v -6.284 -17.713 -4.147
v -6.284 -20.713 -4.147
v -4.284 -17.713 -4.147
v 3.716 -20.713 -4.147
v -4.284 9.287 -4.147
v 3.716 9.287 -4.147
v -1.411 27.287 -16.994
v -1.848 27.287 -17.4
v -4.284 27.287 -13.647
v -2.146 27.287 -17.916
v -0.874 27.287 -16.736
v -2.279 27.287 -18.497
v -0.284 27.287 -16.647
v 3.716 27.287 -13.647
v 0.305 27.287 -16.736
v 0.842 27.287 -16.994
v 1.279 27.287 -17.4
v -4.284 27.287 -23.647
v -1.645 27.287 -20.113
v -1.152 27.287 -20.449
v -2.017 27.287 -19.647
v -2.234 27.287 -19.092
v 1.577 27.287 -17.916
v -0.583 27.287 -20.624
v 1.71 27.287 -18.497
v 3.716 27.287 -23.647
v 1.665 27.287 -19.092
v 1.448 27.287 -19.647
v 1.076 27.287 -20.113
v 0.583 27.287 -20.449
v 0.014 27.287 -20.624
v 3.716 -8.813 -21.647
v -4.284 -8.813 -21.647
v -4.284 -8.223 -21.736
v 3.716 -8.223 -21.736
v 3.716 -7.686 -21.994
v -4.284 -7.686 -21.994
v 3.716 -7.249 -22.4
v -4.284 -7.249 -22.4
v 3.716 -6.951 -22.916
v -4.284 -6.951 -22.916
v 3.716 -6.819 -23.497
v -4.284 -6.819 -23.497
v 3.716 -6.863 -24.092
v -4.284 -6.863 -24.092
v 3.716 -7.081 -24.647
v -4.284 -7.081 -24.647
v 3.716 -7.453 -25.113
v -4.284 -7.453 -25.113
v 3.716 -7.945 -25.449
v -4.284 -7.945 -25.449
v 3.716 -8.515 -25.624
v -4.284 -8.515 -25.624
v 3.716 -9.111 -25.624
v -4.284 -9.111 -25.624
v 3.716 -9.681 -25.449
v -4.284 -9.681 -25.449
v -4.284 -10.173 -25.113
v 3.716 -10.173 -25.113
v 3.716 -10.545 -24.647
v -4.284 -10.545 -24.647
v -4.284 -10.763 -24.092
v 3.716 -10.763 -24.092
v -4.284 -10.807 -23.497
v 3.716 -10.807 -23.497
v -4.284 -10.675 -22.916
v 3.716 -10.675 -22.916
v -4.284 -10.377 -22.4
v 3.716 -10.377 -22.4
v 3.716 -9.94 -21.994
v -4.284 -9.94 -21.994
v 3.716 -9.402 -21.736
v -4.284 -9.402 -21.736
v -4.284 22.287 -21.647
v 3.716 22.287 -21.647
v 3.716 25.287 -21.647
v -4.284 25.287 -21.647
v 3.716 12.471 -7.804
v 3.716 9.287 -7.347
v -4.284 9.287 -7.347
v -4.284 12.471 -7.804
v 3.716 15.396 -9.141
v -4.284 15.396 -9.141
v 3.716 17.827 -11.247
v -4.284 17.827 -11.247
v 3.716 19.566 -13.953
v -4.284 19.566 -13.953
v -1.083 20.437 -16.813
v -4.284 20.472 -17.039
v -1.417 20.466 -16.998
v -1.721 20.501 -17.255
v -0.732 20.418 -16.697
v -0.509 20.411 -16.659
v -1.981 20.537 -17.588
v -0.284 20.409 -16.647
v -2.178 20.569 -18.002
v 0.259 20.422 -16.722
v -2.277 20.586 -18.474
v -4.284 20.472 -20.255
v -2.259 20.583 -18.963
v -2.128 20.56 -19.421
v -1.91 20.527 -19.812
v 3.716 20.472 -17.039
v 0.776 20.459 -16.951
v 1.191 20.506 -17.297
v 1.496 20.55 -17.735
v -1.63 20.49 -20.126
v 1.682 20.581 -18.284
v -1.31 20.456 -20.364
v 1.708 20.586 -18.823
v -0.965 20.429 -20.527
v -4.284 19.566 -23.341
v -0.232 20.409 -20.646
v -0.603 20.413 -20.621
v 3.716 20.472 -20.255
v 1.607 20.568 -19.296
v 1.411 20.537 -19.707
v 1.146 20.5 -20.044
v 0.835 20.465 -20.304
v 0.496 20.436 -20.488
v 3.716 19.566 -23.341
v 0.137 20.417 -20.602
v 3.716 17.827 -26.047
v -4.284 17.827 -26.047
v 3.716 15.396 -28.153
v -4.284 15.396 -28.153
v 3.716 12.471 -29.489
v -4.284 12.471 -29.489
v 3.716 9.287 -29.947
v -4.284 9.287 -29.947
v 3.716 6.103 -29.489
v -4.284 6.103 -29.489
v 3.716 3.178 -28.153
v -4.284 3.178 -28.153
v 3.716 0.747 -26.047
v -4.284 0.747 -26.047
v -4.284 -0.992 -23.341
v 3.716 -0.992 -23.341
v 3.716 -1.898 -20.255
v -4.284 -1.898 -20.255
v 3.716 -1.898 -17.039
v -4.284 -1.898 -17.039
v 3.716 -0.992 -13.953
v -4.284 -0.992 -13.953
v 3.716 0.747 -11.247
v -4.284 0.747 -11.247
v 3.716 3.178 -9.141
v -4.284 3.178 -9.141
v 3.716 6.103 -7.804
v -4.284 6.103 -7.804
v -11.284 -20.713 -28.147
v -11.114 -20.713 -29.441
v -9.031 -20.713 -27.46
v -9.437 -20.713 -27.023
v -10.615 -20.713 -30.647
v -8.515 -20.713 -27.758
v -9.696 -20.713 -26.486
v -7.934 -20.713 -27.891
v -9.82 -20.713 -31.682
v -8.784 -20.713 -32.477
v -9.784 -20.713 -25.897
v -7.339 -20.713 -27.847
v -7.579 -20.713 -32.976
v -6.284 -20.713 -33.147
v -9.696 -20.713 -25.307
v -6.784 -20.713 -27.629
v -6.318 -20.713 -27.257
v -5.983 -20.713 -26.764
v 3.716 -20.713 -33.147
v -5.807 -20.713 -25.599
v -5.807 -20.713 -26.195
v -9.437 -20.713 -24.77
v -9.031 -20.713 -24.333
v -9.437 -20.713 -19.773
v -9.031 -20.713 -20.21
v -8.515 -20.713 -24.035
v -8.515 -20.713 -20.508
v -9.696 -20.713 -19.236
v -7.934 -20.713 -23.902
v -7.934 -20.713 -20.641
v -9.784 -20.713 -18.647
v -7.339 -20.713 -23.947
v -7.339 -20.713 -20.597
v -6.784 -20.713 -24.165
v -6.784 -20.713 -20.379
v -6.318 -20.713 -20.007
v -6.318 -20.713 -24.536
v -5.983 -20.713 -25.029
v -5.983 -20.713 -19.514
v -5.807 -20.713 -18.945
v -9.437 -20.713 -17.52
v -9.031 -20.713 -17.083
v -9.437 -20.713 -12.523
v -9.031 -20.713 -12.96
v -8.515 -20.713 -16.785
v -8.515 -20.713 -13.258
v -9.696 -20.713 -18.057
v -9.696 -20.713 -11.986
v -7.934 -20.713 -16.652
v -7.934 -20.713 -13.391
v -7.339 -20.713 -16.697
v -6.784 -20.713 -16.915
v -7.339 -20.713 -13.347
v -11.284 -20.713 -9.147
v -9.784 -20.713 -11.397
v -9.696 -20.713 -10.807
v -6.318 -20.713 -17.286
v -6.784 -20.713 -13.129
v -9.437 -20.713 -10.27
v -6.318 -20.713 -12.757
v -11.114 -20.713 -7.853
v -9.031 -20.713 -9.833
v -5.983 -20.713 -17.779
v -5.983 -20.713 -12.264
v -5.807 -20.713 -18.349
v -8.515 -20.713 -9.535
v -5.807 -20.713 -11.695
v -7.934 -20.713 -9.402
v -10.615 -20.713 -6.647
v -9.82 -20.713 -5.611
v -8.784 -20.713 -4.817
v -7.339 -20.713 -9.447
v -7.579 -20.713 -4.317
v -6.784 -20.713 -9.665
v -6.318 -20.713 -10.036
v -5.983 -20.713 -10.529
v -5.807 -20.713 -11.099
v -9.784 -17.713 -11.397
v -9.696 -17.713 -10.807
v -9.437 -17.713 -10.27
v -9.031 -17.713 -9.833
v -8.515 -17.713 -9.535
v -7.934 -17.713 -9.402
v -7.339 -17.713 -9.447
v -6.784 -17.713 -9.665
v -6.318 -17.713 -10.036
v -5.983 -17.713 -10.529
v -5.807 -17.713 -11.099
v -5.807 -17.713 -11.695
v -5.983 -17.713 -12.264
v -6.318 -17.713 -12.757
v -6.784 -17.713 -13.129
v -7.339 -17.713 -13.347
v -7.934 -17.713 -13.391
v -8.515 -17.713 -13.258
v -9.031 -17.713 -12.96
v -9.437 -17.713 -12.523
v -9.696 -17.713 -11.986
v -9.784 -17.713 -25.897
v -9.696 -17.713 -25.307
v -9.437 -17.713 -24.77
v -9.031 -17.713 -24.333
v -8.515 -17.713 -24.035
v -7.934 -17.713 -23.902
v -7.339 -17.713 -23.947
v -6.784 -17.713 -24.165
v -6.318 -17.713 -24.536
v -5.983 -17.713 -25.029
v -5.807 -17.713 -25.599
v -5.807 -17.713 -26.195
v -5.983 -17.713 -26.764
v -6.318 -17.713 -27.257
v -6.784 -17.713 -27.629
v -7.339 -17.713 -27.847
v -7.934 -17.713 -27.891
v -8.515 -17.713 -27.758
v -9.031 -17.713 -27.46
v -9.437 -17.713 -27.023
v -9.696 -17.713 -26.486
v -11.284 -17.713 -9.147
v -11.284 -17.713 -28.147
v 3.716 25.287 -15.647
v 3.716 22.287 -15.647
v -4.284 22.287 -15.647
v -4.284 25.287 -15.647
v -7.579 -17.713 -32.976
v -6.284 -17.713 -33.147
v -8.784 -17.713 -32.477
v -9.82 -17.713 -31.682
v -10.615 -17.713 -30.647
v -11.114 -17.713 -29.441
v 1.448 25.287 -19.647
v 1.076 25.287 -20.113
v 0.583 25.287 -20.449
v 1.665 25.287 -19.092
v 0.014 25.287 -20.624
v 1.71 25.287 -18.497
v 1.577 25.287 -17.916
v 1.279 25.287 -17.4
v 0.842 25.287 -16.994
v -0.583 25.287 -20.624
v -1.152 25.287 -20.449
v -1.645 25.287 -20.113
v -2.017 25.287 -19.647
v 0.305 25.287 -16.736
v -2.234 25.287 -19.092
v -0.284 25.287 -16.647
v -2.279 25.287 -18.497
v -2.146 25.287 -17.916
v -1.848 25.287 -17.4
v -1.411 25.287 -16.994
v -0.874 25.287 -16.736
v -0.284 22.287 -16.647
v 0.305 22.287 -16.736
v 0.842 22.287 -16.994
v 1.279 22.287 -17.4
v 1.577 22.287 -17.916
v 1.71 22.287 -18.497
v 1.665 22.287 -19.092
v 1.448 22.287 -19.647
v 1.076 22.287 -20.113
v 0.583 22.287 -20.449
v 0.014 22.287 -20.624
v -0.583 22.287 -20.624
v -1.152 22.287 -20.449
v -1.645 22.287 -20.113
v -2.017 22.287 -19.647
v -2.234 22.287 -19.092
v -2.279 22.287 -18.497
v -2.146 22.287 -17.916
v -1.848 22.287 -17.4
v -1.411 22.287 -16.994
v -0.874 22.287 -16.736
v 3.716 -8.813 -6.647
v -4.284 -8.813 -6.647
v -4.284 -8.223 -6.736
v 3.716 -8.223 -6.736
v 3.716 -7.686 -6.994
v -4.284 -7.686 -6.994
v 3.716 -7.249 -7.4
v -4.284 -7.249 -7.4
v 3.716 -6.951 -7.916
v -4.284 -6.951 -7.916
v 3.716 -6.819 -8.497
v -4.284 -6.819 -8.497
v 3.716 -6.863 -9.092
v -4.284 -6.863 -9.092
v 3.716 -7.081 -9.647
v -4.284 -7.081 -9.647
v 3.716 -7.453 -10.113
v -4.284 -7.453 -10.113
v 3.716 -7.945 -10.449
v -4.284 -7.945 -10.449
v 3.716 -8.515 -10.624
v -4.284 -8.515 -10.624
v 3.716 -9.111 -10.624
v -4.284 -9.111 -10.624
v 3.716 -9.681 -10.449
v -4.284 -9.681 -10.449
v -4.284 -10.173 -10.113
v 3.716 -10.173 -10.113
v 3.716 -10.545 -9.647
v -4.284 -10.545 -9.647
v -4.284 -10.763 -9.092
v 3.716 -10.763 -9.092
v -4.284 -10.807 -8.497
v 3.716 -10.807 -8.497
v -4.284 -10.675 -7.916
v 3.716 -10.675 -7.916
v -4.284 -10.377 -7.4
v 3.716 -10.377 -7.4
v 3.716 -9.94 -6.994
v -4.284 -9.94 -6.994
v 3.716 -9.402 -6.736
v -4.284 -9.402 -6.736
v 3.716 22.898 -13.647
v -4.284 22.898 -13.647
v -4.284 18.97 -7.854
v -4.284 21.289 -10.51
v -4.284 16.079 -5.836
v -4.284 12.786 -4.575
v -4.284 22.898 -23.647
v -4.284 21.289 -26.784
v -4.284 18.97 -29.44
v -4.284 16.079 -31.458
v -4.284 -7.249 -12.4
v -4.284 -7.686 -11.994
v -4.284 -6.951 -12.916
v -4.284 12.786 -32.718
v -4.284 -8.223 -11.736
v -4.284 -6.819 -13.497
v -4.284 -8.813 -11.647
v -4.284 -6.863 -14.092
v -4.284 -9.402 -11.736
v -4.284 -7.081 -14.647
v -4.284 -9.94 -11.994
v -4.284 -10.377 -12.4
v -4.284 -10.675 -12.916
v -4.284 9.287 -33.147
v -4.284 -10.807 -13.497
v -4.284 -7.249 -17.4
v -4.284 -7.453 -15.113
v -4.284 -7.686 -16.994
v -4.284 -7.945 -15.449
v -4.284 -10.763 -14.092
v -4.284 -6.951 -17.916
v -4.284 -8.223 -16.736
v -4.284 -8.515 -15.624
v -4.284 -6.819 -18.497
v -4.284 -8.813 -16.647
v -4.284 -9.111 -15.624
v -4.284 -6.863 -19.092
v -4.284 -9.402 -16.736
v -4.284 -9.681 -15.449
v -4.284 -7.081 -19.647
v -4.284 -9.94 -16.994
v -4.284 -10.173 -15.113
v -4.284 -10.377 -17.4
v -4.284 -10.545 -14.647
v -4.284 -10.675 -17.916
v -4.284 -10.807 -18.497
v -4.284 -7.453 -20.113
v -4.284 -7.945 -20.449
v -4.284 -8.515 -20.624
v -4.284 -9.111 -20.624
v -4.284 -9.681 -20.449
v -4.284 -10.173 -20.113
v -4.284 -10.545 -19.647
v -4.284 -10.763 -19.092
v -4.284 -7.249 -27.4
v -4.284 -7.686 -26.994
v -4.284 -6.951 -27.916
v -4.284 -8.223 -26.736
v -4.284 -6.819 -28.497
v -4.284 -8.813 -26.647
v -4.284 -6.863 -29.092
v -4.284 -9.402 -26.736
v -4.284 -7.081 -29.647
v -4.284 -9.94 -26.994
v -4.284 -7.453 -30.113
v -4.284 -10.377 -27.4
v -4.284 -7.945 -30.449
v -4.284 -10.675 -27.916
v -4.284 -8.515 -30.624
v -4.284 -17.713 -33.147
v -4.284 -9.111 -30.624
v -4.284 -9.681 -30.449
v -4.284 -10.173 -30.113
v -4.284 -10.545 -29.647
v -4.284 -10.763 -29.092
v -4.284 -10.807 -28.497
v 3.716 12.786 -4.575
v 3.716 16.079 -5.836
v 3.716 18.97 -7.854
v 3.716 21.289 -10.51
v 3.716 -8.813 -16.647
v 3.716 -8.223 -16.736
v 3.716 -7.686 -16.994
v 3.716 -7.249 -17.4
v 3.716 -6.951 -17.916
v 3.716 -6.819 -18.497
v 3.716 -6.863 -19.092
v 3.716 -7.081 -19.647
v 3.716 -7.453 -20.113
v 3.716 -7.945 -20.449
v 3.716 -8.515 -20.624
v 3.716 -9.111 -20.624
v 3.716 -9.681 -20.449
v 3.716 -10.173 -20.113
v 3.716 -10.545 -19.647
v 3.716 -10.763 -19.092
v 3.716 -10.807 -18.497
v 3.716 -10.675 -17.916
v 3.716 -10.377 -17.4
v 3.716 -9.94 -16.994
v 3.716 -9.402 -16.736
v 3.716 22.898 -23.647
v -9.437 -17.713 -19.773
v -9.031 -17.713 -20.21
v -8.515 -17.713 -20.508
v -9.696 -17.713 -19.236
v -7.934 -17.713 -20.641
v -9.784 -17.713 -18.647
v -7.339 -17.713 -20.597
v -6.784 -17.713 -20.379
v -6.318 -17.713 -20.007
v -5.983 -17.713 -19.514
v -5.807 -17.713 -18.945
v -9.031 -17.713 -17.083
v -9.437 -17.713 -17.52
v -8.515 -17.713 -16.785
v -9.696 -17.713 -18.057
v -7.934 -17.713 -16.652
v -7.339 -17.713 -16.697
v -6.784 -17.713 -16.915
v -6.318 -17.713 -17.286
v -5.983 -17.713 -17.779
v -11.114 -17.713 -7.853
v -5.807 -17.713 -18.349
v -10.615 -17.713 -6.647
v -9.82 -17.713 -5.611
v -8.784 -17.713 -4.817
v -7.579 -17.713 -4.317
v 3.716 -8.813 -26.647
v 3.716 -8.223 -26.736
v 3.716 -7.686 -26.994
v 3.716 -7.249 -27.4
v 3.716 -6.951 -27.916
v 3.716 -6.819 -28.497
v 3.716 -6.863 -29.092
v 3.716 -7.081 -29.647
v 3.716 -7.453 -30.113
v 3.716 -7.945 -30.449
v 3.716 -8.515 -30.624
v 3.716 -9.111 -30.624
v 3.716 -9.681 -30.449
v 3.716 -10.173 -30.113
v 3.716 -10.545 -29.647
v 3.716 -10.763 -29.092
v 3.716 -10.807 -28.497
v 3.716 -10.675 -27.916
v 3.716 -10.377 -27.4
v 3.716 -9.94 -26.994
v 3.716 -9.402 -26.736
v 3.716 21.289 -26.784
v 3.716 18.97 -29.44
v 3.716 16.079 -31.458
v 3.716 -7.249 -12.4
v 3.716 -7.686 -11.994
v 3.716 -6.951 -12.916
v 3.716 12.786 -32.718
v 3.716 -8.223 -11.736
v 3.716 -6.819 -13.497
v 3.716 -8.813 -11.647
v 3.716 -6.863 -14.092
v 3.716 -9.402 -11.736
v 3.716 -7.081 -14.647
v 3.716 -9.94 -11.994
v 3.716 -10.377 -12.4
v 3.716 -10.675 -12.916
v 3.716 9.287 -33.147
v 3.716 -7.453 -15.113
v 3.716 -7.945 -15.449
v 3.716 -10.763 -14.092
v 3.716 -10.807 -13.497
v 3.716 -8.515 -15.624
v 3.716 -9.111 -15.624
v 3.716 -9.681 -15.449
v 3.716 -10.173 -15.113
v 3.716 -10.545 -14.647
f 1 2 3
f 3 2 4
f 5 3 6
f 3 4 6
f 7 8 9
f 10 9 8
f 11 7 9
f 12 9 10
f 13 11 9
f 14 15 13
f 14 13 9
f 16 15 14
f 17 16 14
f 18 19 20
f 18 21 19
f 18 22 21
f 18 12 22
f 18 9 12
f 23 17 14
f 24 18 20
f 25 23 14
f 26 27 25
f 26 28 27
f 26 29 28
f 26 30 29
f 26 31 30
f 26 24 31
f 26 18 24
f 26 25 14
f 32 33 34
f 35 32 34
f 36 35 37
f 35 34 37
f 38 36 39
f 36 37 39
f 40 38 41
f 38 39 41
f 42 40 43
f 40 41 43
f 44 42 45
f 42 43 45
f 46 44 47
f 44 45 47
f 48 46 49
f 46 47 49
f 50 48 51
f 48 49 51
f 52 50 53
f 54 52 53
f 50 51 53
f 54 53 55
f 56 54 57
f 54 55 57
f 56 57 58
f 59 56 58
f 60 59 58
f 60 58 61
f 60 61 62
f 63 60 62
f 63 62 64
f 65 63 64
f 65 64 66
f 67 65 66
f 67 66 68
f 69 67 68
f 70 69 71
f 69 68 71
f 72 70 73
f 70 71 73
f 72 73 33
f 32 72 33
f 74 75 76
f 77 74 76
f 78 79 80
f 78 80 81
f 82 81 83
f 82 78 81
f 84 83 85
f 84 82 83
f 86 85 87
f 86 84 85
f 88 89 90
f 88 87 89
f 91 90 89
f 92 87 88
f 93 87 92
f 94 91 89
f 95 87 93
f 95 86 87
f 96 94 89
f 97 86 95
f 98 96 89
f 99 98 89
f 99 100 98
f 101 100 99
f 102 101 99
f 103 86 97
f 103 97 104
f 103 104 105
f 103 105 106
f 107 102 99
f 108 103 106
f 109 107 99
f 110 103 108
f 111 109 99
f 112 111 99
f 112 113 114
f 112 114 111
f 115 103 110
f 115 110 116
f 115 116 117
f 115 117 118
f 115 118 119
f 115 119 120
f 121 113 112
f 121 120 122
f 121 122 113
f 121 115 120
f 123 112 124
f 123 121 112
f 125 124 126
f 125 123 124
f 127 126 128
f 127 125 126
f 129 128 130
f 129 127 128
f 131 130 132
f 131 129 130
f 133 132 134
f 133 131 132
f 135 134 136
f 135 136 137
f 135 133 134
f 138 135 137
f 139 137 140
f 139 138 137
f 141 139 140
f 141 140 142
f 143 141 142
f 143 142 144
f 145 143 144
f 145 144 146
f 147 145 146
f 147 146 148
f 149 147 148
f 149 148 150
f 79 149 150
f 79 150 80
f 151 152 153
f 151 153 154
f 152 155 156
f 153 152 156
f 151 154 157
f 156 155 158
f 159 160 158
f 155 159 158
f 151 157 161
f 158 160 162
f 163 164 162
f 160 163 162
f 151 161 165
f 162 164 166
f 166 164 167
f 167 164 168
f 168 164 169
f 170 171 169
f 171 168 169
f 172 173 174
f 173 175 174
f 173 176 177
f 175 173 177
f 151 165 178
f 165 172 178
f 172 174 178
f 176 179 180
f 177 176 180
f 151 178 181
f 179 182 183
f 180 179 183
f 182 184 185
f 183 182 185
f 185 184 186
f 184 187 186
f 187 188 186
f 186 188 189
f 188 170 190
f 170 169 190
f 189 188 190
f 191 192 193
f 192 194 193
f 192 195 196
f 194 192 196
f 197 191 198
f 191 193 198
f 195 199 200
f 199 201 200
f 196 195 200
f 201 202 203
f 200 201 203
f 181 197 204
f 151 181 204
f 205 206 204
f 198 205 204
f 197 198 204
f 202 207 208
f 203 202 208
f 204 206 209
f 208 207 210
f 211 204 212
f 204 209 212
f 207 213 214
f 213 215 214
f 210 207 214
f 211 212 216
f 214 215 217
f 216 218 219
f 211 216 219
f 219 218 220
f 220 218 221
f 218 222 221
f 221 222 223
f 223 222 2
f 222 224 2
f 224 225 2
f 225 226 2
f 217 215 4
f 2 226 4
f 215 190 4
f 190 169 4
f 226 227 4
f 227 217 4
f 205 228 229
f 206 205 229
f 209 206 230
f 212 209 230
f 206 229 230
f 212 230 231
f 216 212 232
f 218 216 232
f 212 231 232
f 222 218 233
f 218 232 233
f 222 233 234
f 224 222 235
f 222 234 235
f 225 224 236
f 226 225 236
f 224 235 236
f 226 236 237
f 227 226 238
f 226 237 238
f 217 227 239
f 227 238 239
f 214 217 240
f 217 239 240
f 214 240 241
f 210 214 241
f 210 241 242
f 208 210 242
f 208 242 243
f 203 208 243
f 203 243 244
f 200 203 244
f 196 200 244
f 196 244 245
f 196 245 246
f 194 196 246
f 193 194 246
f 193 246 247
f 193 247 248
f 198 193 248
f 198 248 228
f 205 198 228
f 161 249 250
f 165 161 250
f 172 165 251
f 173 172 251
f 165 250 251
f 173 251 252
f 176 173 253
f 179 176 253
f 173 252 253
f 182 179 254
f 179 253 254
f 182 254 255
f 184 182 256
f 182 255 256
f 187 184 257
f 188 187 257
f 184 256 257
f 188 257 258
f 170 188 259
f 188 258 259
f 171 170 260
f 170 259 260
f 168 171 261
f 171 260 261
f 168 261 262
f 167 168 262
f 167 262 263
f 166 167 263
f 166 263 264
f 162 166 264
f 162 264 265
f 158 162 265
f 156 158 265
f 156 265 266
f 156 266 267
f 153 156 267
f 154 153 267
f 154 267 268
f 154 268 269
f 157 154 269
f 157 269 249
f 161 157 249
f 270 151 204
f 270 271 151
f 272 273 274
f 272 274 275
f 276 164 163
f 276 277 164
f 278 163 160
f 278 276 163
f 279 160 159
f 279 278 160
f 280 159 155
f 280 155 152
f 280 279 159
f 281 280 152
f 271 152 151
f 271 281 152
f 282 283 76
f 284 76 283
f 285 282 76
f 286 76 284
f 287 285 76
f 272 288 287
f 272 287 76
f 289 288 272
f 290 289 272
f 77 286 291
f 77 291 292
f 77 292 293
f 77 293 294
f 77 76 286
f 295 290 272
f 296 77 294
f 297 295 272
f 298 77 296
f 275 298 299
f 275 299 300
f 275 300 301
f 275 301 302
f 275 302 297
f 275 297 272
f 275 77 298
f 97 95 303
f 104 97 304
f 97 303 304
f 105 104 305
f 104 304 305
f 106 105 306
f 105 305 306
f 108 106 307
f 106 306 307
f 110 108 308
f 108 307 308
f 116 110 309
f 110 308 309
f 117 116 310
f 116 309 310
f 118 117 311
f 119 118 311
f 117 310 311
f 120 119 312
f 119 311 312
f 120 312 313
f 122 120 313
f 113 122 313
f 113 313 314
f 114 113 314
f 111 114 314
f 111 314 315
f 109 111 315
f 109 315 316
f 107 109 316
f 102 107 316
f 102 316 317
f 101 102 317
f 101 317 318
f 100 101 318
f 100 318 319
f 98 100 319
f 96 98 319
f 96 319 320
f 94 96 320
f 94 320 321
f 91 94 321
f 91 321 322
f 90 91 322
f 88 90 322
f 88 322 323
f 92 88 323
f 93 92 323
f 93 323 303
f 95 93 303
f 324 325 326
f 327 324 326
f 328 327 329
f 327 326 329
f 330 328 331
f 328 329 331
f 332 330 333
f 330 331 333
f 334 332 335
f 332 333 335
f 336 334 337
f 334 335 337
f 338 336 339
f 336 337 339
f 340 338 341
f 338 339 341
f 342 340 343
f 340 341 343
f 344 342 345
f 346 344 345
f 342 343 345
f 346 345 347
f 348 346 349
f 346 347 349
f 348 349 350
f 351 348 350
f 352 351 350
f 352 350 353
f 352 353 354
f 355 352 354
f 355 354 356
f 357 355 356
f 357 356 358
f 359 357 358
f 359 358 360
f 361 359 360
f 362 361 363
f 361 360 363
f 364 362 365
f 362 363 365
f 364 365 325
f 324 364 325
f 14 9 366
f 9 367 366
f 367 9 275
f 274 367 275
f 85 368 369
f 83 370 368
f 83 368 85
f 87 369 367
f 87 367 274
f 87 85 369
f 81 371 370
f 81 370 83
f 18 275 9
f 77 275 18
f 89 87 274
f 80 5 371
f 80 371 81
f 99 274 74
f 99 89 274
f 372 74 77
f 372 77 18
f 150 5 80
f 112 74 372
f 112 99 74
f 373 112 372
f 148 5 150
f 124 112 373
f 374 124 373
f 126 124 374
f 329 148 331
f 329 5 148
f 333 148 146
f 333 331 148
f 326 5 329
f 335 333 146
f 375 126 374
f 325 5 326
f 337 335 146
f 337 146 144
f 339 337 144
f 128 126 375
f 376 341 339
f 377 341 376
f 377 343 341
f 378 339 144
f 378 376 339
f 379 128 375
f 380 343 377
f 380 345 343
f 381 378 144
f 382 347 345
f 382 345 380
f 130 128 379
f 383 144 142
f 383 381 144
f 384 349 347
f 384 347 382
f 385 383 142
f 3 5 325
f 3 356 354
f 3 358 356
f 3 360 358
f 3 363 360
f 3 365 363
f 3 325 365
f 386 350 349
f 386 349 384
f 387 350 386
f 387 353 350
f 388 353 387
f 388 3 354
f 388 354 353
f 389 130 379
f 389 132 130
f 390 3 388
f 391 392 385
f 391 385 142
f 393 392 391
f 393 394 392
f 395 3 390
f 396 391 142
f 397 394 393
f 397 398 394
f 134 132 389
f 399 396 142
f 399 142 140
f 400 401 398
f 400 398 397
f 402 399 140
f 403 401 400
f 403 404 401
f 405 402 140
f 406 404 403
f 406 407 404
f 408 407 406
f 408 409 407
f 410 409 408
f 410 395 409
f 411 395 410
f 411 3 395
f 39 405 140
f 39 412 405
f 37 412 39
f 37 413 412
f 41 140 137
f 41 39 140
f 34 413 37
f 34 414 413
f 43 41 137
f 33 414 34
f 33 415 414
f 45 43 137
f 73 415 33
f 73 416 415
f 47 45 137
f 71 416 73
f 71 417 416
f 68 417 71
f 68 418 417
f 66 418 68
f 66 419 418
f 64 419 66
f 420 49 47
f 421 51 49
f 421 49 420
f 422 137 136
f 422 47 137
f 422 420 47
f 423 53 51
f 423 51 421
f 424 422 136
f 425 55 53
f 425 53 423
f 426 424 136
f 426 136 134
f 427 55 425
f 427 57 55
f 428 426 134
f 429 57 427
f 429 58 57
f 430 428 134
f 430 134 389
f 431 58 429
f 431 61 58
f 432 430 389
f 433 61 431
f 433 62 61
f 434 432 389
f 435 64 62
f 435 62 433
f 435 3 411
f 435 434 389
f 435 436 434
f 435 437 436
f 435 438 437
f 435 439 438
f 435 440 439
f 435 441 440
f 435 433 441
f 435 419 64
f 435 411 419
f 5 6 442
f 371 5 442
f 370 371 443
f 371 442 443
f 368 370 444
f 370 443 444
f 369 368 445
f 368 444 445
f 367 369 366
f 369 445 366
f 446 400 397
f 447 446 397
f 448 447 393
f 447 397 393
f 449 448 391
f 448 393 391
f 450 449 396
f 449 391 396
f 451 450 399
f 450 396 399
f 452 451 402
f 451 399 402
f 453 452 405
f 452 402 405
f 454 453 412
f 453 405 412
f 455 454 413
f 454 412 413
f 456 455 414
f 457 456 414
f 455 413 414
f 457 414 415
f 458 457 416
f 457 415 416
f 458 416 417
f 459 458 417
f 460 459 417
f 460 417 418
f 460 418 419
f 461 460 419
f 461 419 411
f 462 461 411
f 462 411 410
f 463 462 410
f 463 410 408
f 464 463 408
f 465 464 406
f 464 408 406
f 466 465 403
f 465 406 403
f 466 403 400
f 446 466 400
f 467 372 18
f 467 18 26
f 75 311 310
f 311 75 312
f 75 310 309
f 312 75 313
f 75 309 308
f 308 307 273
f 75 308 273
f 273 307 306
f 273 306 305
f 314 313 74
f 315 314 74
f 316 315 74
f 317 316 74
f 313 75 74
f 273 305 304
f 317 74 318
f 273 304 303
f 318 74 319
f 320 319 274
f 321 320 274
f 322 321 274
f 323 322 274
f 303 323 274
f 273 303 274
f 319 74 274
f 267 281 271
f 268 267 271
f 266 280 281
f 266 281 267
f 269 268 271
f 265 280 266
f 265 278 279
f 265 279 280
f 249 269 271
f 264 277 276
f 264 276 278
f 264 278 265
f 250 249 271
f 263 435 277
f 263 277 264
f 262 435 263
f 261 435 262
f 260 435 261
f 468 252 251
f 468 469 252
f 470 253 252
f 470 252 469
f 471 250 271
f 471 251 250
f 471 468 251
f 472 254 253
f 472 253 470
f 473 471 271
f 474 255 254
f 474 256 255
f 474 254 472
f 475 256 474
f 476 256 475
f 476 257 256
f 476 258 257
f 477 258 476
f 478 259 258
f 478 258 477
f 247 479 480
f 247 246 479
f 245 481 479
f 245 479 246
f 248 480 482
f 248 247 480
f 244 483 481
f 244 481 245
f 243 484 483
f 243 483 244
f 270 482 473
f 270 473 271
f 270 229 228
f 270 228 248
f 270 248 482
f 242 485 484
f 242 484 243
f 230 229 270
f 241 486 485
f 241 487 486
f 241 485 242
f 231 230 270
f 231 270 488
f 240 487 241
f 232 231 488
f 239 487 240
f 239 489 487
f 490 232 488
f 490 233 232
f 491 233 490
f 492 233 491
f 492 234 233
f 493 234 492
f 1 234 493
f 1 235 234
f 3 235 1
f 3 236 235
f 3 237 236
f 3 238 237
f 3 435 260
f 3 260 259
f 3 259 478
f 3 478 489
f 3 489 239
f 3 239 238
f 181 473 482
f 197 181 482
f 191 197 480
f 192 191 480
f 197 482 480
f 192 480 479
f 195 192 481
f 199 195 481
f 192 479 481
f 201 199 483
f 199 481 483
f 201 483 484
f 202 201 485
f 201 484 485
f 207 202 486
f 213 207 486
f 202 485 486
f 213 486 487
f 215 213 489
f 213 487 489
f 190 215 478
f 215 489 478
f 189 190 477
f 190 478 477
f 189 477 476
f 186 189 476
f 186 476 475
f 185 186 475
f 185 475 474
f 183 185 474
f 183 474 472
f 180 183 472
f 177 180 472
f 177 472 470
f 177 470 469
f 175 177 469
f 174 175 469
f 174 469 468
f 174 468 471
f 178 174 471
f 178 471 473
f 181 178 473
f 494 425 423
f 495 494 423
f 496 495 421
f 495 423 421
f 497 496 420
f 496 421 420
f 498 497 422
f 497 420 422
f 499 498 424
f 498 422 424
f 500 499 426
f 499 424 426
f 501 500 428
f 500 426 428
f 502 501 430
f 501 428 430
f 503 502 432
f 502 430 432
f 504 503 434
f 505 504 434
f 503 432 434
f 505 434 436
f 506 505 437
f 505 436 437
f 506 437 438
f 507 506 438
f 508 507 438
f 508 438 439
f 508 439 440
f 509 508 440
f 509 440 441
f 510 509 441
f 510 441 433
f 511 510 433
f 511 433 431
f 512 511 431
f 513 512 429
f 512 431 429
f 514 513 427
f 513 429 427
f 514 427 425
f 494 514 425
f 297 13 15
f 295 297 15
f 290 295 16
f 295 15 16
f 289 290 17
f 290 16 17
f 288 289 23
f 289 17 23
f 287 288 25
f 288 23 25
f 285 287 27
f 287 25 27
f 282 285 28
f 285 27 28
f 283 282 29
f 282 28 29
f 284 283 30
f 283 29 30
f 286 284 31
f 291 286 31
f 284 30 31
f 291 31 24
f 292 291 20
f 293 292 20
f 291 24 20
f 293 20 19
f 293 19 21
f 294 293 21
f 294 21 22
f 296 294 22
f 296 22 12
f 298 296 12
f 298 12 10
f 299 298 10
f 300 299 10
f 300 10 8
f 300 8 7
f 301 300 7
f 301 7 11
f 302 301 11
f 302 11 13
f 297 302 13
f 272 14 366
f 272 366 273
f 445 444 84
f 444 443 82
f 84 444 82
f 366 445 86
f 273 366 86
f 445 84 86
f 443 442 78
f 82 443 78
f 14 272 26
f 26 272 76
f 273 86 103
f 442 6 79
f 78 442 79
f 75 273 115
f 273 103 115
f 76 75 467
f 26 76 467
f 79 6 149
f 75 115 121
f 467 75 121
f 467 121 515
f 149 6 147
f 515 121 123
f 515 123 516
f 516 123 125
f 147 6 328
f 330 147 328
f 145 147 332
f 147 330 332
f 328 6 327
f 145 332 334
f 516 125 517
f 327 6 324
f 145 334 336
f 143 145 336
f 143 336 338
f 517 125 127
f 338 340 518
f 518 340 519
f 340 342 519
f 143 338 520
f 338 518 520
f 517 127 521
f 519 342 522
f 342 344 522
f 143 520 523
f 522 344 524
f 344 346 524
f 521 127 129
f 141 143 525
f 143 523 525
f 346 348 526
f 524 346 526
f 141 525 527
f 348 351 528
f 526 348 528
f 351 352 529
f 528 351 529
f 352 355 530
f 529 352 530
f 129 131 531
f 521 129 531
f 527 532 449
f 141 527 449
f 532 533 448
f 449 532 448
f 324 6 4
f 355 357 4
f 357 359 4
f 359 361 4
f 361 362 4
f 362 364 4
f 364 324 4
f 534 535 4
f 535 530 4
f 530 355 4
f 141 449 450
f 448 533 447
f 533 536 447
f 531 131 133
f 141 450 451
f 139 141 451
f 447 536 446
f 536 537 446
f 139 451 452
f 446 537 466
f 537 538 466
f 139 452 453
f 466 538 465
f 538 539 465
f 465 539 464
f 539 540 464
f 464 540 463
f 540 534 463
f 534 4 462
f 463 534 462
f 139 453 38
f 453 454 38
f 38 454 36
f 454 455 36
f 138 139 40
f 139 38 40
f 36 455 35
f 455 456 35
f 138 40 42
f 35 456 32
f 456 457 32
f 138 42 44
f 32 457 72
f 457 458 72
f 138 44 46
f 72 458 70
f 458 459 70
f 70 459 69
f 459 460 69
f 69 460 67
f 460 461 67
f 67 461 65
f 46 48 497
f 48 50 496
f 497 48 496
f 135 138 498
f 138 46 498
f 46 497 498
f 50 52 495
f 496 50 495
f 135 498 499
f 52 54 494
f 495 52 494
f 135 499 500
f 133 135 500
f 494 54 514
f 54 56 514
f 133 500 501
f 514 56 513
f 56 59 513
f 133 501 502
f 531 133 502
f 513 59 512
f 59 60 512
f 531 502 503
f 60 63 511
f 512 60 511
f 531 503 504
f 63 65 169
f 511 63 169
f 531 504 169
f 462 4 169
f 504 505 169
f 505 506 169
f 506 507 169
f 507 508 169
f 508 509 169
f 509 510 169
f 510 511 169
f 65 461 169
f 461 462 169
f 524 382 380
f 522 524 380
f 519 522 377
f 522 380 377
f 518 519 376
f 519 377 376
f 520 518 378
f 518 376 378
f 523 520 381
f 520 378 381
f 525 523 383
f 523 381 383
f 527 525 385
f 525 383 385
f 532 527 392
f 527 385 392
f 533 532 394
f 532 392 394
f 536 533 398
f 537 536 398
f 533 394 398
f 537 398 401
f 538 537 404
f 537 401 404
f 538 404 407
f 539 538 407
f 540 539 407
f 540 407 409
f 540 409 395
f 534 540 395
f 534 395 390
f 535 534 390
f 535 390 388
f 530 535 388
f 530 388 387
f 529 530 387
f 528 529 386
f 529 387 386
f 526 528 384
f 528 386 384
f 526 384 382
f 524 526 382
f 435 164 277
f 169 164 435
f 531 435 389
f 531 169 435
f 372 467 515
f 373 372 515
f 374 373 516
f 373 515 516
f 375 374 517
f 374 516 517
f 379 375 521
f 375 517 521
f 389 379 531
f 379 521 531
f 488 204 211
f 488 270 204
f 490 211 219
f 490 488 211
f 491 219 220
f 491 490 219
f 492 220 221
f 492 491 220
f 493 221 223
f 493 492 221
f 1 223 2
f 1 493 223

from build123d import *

# Parameters (mm, degrees)
SKETCH15_R           = 11.5
BOSS_EXTRUDE8_DEPTH  = 8
BOSS_EXTRUDE9_START  = -8
SKETCH16_R           = 11.5
SKETCH16_R_2         = 11.3
BOSS_EXTRUDE9_DEPTH  = 8
SKETCH17_W           = 10
SKETCH17_H           = 3
BOSS_EXTRUDE10_DEPTH = 8
SKETCH18_W           = 8
SKETCH18_H           = 10
BOSS_EXTRUDE11_DEPTH = 2
SKETCH19_W           = 6
SKETCH19_H           = 3
CUT_EXTRUDE4_DEPTH   = 8
SKETCH20_R           = 2
CUT_EXTRUDE5_DEPTH   = 9
SKETCH21_W           = 29
SKETCH21_H           = 3
BOSS_EXTRUDE12_DEPTH = 7
SKETCH22_R           = 2
CUT_EXTRUDE6_DEPTH   = 7
FILLET1_R            = 5
SKETCH24_R           = 2
CUT_EXTRUDE10_DEPTH  = 8


with BuildPart() as part:
    # Sketch15 → Boss-Extrude8 (new body)
    with BuildSketch(Plane(origin=(3.715547427, 0, 0), x_dir=(0, 0, -1), z_dir=(1, 0, 0))):
        with BuildLine():
            Line((33.146692928, -20.712987114), (4.146692928, -20.712987114))
            Line((4.146692928, -20.712987114), (4.146692928, 9.287012886))
            ThreePointArc((4.146692928, 9.287012886), (18.646692928, 23.787012886), (33.146692928, 9.287012886))
            Line((33.146692928, 9.287012886), (33.146692928, -20.712987114))
        make_face()
        with Locations((18.646692928, 9.287012886)):
            Circle(SKETCH15_R, mode=Mode.SUBTRACT)
    extrude(amount=-BOSS_EXTRUDE8_DEPTH)

    # Sketch16 → Boss-Extrude9 (add)
    with BuildSketch(Plane.ZY.offset(4.284452573).offset(BOSS_EXTRUDE9_START)):
        with Locations((-18.646692928, 9.287012886)):
            Circle(SKETCH16_R)
        with Locations((-18.646692928, 9.287012886)):
            Circle(SKETCH16_R_2, mode=Mode.SUBTRACT)
    extrude(amount=BOSS_EXTRUDE9_DEPTH)

    # Sketch17 → Boss-Extrude10 (add)
    with BuildSketch(Plane.ZY.offset(4.284452573)):
        with Locations((-18.646692928, 23.787012886)):
            Rectangle(SKETCH17_W, SKETCH17_H)
    extrude(amount=-BOSS_EXTRUDE10_DEPTH)

    # Sketch18 → Boss-Extrude11 (add)
    with BuildSketch(Plane(origin=(0, 25.287012886, 0), x_dir=(1, 0, 0), z_dir=(0, 1, 0))):
        with Locations((-0.284452573, 18.646692928)):
            Rectangle(SKETCH18_W, SKETCH18_H)
    extrude(amount=BOSS_EXTRUDE11_DEPTH)

    # Sketch19 → Cut-Extrude4 (cut)
    with BuildSketch(Plane.ZY.offset(4.284452573)):
        with Locations((-18.646692928, 23.787012886)):
            Rectangle(SKETCH19_W, SKETCH19_H)
    extrude(amount=-CUT_EXTRUDE4_DEPTH, mode=Mode.SUBTRACT)

    # Sketch20 → Cut-Extrude5 (cut)
    with BuildSketch(Plane(origin=(0, 27.287012886, 0), x_dir=(1, 0, 0), z_dir=(0, 1, 0))):
        with Locations(Location((-0.284452573, 18.646692928, 0), (0, 0, 270))):
            Circle(SKETCH20_R)
    extrude(amount=-CUT_EXTRUDE5_DEPTH, mode=Mode.SUBTRACT)

    # Sketch21 → Boss-Extrude12 (add)
    with BuildSketch(Plane.ZY.offset(4.284452573)):
        with Locations((-18.646692928, -19.212987114)):
            Rectangle(SKETCH21_W, SKETCH21_H)
    extrude(amount=BOSS_EXTRUDE12_DEPTH)

    # Sketch22 → Cut-Extrude6 (cut)
    with BuildSketch(Plane(origin=(0, -17.712987114, 0), x_dir=(1, 0, 0), z_dir=(0, 1, 0))):
        with Locations(Location((-7.784452573, 11.396692928, 0), (0, 0, 180))):
            Circle(SKETCH22_R)
        with Locations(Location((-7.784452573, 18.646692928, 0), (0, 0, 180))):
            Circle(SKETCH22_R)
        with Locations(Location((-7.784452573, 25.896692928, 0), (0, 0, 180))):
            Circle(SKETCH22_R)
    extrude(amount=-CUT_EXTRUDE6_DEPTH, mode=Mode.SUBTRACT)

    # Fillet1
    fillet1_edges = [part.edges().sort_by_distance(p)[0] for p in [
        (-11.284452573, -19.212987114, -33.146692928),
        (-11.284452573, -19.212987114, -4.146692928),
    ]]
    fillet(fillet1_edges, radius=FILLET1_R)

    # Sketch24 → Cut-Extrude10 (cut)
    with BuildSketch(Plane.ZY.offset(4.284452573)):
        with Locations((-18.646692928, -8.812987114)):
            Circle(SKETCH24_R)
        with Locations((-13.646692928, -8.812987114)):
            Circle(SKETCH24_R)
        with Locations((-23.646692928, -8.812987114)):
            Circle(SKETCH24_R)
        with Locations((-28.646692928, -8.812987114)):
            Circle(SKETCH24_R)
        with Locations((-8.646692928, -8.812987114)):
            Circle(SKETCH24_R)
    extrude(amount=-CUT_EXTRUDE10_DEPTH, mode=Mode.SUBTRACT)


solid = part.part
